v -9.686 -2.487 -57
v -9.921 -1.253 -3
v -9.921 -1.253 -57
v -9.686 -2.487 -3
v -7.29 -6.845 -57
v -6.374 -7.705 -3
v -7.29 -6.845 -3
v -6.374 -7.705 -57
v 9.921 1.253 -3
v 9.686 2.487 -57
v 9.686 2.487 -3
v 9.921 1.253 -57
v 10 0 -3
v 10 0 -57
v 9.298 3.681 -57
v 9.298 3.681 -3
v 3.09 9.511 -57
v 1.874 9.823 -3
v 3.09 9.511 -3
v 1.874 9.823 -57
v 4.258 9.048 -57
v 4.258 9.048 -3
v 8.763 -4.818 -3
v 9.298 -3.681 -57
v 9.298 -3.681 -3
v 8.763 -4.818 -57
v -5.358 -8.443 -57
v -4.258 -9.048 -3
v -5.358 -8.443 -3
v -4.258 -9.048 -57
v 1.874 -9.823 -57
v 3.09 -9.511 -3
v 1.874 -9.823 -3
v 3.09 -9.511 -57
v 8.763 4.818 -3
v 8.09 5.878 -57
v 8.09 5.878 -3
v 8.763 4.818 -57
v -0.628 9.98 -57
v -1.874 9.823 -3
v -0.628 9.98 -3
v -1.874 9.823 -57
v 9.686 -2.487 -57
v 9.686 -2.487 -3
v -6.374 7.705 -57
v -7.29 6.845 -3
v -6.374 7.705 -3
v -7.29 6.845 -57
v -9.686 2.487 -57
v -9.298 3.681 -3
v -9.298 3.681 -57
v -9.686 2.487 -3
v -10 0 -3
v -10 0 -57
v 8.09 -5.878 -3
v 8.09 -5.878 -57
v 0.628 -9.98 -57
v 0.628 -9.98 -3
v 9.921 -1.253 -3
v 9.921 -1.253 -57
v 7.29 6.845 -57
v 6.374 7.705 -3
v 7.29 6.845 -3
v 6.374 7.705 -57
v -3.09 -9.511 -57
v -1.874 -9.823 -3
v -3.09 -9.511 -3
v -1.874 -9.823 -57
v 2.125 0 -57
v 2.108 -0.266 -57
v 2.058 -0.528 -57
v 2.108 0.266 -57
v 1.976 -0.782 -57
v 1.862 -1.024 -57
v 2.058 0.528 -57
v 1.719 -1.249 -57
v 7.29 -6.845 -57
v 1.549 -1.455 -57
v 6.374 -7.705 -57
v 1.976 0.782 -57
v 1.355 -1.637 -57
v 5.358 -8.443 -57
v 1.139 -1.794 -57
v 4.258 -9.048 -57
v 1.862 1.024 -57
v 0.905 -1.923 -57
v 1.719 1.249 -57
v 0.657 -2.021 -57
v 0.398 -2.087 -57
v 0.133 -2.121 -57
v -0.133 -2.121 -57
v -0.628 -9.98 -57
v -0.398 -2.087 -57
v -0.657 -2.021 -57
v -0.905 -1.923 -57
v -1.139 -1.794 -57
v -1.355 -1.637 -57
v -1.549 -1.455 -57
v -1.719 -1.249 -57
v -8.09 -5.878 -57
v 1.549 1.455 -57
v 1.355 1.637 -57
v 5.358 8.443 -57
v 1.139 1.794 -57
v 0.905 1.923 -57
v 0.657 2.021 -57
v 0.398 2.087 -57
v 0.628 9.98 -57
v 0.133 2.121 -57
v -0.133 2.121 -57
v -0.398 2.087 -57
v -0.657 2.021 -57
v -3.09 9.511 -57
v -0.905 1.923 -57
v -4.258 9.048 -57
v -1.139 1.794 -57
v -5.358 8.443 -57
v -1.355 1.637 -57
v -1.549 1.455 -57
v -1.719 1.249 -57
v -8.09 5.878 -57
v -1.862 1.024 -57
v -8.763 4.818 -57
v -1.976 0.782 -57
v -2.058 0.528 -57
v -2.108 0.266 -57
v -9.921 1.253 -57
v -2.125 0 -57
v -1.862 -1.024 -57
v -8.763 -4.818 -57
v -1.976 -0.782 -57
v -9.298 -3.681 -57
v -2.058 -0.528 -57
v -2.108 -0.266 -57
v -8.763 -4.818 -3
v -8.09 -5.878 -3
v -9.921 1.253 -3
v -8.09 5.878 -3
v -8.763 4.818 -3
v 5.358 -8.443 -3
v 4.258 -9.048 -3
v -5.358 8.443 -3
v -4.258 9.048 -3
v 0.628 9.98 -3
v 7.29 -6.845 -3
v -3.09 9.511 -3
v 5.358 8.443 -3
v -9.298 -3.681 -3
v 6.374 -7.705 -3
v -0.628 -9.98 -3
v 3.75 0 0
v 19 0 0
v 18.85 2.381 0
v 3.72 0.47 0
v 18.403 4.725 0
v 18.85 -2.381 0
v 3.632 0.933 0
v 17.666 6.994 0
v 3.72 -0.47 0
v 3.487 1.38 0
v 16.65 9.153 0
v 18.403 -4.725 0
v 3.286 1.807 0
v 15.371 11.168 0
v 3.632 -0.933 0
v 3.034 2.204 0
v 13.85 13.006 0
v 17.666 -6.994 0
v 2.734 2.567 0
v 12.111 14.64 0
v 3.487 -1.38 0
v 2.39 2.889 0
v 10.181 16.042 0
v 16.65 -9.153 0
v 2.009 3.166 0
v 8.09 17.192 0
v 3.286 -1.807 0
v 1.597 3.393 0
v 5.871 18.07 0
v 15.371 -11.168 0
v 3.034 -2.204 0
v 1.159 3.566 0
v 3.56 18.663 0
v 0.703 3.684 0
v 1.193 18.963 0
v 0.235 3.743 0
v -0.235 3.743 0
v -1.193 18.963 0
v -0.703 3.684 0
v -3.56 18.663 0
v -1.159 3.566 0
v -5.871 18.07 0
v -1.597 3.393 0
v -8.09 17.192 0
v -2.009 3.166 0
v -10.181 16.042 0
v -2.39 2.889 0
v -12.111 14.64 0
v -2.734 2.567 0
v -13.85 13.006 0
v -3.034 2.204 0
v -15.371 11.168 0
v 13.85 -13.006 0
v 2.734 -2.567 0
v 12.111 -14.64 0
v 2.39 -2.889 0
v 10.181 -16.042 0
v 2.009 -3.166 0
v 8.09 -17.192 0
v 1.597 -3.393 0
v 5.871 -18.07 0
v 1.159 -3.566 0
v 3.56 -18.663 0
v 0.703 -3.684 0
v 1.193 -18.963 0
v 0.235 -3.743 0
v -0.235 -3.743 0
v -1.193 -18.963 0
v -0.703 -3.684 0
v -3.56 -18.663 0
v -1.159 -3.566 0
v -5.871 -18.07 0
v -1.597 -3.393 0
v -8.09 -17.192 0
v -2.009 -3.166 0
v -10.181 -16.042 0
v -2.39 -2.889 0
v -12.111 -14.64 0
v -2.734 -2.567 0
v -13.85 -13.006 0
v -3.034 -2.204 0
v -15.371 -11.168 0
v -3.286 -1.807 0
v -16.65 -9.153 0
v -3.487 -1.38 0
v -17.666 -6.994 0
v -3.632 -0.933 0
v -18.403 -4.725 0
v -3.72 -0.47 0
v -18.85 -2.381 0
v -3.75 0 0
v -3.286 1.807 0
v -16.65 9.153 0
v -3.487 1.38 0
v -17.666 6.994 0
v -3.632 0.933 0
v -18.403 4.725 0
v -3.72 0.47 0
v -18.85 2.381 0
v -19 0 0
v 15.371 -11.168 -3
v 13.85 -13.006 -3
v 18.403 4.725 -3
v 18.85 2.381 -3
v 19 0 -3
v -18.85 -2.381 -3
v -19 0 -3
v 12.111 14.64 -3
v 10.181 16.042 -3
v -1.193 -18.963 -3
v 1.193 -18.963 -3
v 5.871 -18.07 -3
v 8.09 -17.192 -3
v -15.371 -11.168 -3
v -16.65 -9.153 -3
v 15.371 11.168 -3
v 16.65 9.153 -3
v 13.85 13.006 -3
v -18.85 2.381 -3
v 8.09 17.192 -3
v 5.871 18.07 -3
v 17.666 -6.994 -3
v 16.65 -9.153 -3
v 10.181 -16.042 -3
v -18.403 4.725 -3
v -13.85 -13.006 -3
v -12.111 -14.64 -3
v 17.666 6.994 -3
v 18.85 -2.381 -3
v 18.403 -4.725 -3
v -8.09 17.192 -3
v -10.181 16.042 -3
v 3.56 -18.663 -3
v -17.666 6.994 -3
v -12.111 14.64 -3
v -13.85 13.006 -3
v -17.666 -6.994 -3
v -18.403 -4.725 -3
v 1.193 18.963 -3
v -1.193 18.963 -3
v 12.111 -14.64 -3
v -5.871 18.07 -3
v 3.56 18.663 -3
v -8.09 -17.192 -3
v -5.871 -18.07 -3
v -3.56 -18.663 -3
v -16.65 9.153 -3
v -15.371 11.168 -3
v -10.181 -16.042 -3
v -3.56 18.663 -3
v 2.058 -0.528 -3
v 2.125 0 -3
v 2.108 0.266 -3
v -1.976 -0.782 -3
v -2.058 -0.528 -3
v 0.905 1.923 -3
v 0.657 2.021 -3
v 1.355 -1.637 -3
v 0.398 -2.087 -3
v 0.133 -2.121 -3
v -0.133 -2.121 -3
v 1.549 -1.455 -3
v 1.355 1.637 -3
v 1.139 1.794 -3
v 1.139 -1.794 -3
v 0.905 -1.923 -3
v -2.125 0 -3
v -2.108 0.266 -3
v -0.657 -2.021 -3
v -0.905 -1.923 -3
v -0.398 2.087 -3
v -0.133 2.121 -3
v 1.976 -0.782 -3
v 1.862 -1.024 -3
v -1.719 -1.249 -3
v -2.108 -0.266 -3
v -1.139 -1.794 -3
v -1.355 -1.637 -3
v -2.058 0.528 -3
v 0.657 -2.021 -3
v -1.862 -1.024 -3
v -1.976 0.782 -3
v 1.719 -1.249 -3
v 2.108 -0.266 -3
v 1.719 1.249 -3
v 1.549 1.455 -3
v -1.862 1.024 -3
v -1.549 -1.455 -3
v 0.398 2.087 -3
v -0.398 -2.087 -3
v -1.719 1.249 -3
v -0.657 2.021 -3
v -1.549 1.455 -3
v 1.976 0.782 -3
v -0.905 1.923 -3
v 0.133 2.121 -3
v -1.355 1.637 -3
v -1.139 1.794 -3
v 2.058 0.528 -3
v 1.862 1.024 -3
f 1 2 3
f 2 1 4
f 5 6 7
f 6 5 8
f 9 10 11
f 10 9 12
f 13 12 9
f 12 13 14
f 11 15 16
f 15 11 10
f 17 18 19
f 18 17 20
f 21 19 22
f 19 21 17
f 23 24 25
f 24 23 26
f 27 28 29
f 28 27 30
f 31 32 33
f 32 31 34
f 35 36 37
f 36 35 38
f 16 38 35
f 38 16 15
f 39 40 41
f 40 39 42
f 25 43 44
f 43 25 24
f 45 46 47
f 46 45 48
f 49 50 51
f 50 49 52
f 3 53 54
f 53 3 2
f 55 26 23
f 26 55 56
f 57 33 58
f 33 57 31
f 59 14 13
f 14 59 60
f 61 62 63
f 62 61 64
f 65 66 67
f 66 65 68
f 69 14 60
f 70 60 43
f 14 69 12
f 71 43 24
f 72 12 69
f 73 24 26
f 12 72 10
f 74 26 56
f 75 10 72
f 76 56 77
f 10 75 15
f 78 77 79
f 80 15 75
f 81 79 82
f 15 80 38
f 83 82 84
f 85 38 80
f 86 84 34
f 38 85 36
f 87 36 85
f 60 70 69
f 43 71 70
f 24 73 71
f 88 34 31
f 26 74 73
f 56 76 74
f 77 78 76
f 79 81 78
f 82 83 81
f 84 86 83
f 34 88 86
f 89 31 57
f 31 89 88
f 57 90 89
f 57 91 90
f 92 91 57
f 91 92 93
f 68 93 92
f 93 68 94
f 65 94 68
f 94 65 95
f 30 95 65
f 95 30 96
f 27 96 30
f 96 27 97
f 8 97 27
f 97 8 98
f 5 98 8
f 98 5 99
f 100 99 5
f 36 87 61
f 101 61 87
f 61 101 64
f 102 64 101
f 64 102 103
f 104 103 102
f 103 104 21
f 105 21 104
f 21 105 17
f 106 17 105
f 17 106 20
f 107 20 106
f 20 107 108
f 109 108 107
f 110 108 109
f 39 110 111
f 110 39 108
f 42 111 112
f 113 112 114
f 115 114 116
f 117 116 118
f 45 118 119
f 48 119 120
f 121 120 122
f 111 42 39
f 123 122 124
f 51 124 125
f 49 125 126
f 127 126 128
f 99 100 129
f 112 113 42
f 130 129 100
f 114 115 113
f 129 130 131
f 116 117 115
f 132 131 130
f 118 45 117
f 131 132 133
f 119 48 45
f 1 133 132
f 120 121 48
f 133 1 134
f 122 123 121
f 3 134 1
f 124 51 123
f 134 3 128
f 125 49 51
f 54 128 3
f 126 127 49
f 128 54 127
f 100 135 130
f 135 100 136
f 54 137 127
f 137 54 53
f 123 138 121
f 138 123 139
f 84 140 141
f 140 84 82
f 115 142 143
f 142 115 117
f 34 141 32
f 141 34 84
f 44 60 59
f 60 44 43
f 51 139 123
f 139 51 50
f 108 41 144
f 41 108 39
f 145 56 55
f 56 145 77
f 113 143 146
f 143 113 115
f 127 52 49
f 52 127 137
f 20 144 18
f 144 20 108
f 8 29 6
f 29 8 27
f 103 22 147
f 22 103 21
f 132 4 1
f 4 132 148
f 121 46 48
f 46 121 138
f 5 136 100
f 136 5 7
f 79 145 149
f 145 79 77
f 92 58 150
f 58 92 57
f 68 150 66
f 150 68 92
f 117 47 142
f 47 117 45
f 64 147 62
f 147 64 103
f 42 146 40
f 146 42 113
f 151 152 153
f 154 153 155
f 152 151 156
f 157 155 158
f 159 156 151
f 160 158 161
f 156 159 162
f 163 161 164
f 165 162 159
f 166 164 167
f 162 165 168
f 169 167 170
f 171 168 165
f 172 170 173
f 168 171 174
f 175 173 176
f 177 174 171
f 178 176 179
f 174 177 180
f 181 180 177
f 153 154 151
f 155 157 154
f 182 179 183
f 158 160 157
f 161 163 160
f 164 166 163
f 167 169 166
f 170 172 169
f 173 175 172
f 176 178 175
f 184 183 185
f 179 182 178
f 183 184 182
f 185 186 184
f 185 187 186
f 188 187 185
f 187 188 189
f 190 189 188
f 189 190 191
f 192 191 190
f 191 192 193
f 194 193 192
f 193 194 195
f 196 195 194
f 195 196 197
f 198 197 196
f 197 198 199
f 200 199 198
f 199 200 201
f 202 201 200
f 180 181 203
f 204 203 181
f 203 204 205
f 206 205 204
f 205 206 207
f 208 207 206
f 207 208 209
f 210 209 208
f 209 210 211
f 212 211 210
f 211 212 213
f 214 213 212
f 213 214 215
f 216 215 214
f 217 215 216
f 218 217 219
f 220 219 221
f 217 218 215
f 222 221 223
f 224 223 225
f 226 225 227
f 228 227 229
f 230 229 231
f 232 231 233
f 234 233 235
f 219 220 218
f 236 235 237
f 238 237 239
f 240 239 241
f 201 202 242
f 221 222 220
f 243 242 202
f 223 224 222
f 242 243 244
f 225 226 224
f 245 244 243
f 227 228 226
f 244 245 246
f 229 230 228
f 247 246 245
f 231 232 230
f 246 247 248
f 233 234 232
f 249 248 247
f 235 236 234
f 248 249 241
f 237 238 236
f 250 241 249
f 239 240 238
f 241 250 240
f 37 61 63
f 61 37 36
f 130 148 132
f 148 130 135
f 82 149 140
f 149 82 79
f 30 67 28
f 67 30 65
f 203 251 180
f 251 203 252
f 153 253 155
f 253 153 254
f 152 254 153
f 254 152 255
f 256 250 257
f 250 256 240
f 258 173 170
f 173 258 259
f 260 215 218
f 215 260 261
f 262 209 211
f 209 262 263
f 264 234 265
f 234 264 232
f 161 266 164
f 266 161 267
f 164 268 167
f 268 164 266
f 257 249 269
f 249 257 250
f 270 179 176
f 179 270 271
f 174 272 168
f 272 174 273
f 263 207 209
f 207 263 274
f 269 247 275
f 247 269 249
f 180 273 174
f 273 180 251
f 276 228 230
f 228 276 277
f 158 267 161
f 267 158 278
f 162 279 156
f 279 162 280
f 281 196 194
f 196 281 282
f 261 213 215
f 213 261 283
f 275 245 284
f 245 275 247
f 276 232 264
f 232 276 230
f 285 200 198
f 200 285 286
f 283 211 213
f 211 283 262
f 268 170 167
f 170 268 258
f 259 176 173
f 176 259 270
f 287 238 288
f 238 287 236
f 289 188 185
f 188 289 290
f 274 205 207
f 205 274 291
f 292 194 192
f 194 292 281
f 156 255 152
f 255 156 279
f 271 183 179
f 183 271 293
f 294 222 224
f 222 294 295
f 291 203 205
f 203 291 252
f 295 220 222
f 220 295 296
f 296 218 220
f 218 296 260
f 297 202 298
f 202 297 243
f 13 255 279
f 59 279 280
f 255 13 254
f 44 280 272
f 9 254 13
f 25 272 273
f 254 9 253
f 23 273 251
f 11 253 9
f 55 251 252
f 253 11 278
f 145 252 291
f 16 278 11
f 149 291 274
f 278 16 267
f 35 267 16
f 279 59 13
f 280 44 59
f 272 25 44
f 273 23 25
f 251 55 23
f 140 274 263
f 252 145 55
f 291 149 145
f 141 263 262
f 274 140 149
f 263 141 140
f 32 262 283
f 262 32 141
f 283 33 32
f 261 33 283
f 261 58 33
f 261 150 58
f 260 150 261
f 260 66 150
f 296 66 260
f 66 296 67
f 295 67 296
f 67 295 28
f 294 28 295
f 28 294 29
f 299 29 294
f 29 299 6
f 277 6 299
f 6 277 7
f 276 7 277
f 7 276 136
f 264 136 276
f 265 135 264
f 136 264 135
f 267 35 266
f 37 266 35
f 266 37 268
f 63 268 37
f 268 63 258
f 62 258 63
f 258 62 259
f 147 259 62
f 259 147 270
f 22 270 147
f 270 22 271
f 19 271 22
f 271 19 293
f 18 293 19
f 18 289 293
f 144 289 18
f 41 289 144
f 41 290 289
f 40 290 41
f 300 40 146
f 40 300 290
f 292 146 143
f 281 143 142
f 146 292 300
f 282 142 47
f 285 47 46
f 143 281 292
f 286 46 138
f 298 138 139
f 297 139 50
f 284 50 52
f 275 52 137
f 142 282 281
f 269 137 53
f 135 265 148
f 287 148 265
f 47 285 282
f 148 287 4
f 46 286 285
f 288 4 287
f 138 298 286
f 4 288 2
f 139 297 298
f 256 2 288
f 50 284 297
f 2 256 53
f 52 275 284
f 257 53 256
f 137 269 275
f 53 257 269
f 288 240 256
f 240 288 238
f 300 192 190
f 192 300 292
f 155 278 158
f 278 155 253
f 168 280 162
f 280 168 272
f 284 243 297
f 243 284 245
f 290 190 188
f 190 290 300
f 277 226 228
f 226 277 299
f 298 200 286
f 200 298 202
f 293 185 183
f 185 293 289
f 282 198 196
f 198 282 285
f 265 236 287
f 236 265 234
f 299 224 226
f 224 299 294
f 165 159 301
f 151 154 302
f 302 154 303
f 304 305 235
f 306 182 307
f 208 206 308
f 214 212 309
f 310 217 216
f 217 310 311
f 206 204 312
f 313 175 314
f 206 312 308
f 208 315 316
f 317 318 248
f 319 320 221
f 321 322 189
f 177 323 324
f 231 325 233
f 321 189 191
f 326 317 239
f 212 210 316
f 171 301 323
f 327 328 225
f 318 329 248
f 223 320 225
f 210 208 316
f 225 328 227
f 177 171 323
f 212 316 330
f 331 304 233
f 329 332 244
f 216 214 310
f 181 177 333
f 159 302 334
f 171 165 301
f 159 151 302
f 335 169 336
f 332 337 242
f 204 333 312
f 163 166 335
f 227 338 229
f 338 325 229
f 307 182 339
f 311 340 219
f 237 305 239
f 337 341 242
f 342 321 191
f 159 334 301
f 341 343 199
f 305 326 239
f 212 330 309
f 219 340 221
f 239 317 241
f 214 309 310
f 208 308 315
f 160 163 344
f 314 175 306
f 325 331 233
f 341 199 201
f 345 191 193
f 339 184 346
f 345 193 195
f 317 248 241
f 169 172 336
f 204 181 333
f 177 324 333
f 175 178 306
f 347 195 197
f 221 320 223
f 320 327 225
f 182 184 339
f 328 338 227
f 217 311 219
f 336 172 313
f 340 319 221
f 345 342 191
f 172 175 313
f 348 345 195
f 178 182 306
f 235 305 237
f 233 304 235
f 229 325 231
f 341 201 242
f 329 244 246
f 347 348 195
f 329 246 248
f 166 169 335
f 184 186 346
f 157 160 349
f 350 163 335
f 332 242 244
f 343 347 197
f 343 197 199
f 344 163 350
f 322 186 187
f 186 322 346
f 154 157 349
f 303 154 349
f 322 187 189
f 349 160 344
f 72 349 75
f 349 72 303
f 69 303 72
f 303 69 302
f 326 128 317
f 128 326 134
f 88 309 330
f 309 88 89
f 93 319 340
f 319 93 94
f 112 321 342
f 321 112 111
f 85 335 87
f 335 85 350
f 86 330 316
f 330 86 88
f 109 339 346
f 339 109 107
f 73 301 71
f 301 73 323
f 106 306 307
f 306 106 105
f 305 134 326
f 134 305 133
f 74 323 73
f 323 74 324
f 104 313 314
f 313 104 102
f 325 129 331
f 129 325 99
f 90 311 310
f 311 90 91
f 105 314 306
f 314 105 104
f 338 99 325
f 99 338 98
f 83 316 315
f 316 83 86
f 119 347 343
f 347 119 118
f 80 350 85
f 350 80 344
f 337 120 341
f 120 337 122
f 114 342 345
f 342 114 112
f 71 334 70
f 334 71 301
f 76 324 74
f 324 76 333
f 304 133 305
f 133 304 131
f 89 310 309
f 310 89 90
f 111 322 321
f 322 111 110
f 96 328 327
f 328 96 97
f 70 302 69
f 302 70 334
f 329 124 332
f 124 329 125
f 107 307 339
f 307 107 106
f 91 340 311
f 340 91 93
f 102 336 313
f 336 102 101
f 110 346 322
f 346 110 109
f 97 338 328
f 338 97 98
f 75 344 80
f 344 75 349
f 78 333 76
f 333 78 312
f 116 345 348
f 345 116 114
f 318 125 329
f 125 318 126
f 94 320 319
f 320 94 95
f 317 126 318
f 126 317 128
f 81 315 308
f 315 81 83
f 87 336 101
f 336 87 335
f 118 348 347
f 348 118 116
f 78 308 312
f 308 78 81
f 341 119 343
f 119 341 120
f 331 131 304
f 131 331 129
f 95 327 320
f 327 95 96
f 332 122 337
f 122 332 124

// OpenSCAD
$fn = 50;


difference() {
	union() {
		translate(v = [0, 0, -57.0000000000]) {
			cylinder(h = 57, r = 10.0000000000);
		}
		translate(v = [0, 0, -3.0000000000]) {
			cylinder(h = 3, r = 19.0000000000);
		}
	}
	union() {
		translate(v = [0, 0, 0]) {
			rotate(a = [0, 0, 0]) {
				difference() {
					union() {
						#translate(v = [0, 0, -57.0000000000]) {
							cylinder(h = 57, r = 2.0000000000);
						}
						#translate(v = [0, 0, -3]) {
							cylinder(h = 3, r = 10.0000000000, r1 = 2.1250000000, r2 = 3.7500000000);
						}
						#translate(v = [0, 0, -57.0000000000]) {
							cylinder(h = 57, r = 2.1250000000);
						}
						#translate(v = [0, 0, -57.0000000000]) {
							cylinder(h = 57, r = 2.0000000000);
						}
					}
					union();
				}
			}
		}
	}
}
